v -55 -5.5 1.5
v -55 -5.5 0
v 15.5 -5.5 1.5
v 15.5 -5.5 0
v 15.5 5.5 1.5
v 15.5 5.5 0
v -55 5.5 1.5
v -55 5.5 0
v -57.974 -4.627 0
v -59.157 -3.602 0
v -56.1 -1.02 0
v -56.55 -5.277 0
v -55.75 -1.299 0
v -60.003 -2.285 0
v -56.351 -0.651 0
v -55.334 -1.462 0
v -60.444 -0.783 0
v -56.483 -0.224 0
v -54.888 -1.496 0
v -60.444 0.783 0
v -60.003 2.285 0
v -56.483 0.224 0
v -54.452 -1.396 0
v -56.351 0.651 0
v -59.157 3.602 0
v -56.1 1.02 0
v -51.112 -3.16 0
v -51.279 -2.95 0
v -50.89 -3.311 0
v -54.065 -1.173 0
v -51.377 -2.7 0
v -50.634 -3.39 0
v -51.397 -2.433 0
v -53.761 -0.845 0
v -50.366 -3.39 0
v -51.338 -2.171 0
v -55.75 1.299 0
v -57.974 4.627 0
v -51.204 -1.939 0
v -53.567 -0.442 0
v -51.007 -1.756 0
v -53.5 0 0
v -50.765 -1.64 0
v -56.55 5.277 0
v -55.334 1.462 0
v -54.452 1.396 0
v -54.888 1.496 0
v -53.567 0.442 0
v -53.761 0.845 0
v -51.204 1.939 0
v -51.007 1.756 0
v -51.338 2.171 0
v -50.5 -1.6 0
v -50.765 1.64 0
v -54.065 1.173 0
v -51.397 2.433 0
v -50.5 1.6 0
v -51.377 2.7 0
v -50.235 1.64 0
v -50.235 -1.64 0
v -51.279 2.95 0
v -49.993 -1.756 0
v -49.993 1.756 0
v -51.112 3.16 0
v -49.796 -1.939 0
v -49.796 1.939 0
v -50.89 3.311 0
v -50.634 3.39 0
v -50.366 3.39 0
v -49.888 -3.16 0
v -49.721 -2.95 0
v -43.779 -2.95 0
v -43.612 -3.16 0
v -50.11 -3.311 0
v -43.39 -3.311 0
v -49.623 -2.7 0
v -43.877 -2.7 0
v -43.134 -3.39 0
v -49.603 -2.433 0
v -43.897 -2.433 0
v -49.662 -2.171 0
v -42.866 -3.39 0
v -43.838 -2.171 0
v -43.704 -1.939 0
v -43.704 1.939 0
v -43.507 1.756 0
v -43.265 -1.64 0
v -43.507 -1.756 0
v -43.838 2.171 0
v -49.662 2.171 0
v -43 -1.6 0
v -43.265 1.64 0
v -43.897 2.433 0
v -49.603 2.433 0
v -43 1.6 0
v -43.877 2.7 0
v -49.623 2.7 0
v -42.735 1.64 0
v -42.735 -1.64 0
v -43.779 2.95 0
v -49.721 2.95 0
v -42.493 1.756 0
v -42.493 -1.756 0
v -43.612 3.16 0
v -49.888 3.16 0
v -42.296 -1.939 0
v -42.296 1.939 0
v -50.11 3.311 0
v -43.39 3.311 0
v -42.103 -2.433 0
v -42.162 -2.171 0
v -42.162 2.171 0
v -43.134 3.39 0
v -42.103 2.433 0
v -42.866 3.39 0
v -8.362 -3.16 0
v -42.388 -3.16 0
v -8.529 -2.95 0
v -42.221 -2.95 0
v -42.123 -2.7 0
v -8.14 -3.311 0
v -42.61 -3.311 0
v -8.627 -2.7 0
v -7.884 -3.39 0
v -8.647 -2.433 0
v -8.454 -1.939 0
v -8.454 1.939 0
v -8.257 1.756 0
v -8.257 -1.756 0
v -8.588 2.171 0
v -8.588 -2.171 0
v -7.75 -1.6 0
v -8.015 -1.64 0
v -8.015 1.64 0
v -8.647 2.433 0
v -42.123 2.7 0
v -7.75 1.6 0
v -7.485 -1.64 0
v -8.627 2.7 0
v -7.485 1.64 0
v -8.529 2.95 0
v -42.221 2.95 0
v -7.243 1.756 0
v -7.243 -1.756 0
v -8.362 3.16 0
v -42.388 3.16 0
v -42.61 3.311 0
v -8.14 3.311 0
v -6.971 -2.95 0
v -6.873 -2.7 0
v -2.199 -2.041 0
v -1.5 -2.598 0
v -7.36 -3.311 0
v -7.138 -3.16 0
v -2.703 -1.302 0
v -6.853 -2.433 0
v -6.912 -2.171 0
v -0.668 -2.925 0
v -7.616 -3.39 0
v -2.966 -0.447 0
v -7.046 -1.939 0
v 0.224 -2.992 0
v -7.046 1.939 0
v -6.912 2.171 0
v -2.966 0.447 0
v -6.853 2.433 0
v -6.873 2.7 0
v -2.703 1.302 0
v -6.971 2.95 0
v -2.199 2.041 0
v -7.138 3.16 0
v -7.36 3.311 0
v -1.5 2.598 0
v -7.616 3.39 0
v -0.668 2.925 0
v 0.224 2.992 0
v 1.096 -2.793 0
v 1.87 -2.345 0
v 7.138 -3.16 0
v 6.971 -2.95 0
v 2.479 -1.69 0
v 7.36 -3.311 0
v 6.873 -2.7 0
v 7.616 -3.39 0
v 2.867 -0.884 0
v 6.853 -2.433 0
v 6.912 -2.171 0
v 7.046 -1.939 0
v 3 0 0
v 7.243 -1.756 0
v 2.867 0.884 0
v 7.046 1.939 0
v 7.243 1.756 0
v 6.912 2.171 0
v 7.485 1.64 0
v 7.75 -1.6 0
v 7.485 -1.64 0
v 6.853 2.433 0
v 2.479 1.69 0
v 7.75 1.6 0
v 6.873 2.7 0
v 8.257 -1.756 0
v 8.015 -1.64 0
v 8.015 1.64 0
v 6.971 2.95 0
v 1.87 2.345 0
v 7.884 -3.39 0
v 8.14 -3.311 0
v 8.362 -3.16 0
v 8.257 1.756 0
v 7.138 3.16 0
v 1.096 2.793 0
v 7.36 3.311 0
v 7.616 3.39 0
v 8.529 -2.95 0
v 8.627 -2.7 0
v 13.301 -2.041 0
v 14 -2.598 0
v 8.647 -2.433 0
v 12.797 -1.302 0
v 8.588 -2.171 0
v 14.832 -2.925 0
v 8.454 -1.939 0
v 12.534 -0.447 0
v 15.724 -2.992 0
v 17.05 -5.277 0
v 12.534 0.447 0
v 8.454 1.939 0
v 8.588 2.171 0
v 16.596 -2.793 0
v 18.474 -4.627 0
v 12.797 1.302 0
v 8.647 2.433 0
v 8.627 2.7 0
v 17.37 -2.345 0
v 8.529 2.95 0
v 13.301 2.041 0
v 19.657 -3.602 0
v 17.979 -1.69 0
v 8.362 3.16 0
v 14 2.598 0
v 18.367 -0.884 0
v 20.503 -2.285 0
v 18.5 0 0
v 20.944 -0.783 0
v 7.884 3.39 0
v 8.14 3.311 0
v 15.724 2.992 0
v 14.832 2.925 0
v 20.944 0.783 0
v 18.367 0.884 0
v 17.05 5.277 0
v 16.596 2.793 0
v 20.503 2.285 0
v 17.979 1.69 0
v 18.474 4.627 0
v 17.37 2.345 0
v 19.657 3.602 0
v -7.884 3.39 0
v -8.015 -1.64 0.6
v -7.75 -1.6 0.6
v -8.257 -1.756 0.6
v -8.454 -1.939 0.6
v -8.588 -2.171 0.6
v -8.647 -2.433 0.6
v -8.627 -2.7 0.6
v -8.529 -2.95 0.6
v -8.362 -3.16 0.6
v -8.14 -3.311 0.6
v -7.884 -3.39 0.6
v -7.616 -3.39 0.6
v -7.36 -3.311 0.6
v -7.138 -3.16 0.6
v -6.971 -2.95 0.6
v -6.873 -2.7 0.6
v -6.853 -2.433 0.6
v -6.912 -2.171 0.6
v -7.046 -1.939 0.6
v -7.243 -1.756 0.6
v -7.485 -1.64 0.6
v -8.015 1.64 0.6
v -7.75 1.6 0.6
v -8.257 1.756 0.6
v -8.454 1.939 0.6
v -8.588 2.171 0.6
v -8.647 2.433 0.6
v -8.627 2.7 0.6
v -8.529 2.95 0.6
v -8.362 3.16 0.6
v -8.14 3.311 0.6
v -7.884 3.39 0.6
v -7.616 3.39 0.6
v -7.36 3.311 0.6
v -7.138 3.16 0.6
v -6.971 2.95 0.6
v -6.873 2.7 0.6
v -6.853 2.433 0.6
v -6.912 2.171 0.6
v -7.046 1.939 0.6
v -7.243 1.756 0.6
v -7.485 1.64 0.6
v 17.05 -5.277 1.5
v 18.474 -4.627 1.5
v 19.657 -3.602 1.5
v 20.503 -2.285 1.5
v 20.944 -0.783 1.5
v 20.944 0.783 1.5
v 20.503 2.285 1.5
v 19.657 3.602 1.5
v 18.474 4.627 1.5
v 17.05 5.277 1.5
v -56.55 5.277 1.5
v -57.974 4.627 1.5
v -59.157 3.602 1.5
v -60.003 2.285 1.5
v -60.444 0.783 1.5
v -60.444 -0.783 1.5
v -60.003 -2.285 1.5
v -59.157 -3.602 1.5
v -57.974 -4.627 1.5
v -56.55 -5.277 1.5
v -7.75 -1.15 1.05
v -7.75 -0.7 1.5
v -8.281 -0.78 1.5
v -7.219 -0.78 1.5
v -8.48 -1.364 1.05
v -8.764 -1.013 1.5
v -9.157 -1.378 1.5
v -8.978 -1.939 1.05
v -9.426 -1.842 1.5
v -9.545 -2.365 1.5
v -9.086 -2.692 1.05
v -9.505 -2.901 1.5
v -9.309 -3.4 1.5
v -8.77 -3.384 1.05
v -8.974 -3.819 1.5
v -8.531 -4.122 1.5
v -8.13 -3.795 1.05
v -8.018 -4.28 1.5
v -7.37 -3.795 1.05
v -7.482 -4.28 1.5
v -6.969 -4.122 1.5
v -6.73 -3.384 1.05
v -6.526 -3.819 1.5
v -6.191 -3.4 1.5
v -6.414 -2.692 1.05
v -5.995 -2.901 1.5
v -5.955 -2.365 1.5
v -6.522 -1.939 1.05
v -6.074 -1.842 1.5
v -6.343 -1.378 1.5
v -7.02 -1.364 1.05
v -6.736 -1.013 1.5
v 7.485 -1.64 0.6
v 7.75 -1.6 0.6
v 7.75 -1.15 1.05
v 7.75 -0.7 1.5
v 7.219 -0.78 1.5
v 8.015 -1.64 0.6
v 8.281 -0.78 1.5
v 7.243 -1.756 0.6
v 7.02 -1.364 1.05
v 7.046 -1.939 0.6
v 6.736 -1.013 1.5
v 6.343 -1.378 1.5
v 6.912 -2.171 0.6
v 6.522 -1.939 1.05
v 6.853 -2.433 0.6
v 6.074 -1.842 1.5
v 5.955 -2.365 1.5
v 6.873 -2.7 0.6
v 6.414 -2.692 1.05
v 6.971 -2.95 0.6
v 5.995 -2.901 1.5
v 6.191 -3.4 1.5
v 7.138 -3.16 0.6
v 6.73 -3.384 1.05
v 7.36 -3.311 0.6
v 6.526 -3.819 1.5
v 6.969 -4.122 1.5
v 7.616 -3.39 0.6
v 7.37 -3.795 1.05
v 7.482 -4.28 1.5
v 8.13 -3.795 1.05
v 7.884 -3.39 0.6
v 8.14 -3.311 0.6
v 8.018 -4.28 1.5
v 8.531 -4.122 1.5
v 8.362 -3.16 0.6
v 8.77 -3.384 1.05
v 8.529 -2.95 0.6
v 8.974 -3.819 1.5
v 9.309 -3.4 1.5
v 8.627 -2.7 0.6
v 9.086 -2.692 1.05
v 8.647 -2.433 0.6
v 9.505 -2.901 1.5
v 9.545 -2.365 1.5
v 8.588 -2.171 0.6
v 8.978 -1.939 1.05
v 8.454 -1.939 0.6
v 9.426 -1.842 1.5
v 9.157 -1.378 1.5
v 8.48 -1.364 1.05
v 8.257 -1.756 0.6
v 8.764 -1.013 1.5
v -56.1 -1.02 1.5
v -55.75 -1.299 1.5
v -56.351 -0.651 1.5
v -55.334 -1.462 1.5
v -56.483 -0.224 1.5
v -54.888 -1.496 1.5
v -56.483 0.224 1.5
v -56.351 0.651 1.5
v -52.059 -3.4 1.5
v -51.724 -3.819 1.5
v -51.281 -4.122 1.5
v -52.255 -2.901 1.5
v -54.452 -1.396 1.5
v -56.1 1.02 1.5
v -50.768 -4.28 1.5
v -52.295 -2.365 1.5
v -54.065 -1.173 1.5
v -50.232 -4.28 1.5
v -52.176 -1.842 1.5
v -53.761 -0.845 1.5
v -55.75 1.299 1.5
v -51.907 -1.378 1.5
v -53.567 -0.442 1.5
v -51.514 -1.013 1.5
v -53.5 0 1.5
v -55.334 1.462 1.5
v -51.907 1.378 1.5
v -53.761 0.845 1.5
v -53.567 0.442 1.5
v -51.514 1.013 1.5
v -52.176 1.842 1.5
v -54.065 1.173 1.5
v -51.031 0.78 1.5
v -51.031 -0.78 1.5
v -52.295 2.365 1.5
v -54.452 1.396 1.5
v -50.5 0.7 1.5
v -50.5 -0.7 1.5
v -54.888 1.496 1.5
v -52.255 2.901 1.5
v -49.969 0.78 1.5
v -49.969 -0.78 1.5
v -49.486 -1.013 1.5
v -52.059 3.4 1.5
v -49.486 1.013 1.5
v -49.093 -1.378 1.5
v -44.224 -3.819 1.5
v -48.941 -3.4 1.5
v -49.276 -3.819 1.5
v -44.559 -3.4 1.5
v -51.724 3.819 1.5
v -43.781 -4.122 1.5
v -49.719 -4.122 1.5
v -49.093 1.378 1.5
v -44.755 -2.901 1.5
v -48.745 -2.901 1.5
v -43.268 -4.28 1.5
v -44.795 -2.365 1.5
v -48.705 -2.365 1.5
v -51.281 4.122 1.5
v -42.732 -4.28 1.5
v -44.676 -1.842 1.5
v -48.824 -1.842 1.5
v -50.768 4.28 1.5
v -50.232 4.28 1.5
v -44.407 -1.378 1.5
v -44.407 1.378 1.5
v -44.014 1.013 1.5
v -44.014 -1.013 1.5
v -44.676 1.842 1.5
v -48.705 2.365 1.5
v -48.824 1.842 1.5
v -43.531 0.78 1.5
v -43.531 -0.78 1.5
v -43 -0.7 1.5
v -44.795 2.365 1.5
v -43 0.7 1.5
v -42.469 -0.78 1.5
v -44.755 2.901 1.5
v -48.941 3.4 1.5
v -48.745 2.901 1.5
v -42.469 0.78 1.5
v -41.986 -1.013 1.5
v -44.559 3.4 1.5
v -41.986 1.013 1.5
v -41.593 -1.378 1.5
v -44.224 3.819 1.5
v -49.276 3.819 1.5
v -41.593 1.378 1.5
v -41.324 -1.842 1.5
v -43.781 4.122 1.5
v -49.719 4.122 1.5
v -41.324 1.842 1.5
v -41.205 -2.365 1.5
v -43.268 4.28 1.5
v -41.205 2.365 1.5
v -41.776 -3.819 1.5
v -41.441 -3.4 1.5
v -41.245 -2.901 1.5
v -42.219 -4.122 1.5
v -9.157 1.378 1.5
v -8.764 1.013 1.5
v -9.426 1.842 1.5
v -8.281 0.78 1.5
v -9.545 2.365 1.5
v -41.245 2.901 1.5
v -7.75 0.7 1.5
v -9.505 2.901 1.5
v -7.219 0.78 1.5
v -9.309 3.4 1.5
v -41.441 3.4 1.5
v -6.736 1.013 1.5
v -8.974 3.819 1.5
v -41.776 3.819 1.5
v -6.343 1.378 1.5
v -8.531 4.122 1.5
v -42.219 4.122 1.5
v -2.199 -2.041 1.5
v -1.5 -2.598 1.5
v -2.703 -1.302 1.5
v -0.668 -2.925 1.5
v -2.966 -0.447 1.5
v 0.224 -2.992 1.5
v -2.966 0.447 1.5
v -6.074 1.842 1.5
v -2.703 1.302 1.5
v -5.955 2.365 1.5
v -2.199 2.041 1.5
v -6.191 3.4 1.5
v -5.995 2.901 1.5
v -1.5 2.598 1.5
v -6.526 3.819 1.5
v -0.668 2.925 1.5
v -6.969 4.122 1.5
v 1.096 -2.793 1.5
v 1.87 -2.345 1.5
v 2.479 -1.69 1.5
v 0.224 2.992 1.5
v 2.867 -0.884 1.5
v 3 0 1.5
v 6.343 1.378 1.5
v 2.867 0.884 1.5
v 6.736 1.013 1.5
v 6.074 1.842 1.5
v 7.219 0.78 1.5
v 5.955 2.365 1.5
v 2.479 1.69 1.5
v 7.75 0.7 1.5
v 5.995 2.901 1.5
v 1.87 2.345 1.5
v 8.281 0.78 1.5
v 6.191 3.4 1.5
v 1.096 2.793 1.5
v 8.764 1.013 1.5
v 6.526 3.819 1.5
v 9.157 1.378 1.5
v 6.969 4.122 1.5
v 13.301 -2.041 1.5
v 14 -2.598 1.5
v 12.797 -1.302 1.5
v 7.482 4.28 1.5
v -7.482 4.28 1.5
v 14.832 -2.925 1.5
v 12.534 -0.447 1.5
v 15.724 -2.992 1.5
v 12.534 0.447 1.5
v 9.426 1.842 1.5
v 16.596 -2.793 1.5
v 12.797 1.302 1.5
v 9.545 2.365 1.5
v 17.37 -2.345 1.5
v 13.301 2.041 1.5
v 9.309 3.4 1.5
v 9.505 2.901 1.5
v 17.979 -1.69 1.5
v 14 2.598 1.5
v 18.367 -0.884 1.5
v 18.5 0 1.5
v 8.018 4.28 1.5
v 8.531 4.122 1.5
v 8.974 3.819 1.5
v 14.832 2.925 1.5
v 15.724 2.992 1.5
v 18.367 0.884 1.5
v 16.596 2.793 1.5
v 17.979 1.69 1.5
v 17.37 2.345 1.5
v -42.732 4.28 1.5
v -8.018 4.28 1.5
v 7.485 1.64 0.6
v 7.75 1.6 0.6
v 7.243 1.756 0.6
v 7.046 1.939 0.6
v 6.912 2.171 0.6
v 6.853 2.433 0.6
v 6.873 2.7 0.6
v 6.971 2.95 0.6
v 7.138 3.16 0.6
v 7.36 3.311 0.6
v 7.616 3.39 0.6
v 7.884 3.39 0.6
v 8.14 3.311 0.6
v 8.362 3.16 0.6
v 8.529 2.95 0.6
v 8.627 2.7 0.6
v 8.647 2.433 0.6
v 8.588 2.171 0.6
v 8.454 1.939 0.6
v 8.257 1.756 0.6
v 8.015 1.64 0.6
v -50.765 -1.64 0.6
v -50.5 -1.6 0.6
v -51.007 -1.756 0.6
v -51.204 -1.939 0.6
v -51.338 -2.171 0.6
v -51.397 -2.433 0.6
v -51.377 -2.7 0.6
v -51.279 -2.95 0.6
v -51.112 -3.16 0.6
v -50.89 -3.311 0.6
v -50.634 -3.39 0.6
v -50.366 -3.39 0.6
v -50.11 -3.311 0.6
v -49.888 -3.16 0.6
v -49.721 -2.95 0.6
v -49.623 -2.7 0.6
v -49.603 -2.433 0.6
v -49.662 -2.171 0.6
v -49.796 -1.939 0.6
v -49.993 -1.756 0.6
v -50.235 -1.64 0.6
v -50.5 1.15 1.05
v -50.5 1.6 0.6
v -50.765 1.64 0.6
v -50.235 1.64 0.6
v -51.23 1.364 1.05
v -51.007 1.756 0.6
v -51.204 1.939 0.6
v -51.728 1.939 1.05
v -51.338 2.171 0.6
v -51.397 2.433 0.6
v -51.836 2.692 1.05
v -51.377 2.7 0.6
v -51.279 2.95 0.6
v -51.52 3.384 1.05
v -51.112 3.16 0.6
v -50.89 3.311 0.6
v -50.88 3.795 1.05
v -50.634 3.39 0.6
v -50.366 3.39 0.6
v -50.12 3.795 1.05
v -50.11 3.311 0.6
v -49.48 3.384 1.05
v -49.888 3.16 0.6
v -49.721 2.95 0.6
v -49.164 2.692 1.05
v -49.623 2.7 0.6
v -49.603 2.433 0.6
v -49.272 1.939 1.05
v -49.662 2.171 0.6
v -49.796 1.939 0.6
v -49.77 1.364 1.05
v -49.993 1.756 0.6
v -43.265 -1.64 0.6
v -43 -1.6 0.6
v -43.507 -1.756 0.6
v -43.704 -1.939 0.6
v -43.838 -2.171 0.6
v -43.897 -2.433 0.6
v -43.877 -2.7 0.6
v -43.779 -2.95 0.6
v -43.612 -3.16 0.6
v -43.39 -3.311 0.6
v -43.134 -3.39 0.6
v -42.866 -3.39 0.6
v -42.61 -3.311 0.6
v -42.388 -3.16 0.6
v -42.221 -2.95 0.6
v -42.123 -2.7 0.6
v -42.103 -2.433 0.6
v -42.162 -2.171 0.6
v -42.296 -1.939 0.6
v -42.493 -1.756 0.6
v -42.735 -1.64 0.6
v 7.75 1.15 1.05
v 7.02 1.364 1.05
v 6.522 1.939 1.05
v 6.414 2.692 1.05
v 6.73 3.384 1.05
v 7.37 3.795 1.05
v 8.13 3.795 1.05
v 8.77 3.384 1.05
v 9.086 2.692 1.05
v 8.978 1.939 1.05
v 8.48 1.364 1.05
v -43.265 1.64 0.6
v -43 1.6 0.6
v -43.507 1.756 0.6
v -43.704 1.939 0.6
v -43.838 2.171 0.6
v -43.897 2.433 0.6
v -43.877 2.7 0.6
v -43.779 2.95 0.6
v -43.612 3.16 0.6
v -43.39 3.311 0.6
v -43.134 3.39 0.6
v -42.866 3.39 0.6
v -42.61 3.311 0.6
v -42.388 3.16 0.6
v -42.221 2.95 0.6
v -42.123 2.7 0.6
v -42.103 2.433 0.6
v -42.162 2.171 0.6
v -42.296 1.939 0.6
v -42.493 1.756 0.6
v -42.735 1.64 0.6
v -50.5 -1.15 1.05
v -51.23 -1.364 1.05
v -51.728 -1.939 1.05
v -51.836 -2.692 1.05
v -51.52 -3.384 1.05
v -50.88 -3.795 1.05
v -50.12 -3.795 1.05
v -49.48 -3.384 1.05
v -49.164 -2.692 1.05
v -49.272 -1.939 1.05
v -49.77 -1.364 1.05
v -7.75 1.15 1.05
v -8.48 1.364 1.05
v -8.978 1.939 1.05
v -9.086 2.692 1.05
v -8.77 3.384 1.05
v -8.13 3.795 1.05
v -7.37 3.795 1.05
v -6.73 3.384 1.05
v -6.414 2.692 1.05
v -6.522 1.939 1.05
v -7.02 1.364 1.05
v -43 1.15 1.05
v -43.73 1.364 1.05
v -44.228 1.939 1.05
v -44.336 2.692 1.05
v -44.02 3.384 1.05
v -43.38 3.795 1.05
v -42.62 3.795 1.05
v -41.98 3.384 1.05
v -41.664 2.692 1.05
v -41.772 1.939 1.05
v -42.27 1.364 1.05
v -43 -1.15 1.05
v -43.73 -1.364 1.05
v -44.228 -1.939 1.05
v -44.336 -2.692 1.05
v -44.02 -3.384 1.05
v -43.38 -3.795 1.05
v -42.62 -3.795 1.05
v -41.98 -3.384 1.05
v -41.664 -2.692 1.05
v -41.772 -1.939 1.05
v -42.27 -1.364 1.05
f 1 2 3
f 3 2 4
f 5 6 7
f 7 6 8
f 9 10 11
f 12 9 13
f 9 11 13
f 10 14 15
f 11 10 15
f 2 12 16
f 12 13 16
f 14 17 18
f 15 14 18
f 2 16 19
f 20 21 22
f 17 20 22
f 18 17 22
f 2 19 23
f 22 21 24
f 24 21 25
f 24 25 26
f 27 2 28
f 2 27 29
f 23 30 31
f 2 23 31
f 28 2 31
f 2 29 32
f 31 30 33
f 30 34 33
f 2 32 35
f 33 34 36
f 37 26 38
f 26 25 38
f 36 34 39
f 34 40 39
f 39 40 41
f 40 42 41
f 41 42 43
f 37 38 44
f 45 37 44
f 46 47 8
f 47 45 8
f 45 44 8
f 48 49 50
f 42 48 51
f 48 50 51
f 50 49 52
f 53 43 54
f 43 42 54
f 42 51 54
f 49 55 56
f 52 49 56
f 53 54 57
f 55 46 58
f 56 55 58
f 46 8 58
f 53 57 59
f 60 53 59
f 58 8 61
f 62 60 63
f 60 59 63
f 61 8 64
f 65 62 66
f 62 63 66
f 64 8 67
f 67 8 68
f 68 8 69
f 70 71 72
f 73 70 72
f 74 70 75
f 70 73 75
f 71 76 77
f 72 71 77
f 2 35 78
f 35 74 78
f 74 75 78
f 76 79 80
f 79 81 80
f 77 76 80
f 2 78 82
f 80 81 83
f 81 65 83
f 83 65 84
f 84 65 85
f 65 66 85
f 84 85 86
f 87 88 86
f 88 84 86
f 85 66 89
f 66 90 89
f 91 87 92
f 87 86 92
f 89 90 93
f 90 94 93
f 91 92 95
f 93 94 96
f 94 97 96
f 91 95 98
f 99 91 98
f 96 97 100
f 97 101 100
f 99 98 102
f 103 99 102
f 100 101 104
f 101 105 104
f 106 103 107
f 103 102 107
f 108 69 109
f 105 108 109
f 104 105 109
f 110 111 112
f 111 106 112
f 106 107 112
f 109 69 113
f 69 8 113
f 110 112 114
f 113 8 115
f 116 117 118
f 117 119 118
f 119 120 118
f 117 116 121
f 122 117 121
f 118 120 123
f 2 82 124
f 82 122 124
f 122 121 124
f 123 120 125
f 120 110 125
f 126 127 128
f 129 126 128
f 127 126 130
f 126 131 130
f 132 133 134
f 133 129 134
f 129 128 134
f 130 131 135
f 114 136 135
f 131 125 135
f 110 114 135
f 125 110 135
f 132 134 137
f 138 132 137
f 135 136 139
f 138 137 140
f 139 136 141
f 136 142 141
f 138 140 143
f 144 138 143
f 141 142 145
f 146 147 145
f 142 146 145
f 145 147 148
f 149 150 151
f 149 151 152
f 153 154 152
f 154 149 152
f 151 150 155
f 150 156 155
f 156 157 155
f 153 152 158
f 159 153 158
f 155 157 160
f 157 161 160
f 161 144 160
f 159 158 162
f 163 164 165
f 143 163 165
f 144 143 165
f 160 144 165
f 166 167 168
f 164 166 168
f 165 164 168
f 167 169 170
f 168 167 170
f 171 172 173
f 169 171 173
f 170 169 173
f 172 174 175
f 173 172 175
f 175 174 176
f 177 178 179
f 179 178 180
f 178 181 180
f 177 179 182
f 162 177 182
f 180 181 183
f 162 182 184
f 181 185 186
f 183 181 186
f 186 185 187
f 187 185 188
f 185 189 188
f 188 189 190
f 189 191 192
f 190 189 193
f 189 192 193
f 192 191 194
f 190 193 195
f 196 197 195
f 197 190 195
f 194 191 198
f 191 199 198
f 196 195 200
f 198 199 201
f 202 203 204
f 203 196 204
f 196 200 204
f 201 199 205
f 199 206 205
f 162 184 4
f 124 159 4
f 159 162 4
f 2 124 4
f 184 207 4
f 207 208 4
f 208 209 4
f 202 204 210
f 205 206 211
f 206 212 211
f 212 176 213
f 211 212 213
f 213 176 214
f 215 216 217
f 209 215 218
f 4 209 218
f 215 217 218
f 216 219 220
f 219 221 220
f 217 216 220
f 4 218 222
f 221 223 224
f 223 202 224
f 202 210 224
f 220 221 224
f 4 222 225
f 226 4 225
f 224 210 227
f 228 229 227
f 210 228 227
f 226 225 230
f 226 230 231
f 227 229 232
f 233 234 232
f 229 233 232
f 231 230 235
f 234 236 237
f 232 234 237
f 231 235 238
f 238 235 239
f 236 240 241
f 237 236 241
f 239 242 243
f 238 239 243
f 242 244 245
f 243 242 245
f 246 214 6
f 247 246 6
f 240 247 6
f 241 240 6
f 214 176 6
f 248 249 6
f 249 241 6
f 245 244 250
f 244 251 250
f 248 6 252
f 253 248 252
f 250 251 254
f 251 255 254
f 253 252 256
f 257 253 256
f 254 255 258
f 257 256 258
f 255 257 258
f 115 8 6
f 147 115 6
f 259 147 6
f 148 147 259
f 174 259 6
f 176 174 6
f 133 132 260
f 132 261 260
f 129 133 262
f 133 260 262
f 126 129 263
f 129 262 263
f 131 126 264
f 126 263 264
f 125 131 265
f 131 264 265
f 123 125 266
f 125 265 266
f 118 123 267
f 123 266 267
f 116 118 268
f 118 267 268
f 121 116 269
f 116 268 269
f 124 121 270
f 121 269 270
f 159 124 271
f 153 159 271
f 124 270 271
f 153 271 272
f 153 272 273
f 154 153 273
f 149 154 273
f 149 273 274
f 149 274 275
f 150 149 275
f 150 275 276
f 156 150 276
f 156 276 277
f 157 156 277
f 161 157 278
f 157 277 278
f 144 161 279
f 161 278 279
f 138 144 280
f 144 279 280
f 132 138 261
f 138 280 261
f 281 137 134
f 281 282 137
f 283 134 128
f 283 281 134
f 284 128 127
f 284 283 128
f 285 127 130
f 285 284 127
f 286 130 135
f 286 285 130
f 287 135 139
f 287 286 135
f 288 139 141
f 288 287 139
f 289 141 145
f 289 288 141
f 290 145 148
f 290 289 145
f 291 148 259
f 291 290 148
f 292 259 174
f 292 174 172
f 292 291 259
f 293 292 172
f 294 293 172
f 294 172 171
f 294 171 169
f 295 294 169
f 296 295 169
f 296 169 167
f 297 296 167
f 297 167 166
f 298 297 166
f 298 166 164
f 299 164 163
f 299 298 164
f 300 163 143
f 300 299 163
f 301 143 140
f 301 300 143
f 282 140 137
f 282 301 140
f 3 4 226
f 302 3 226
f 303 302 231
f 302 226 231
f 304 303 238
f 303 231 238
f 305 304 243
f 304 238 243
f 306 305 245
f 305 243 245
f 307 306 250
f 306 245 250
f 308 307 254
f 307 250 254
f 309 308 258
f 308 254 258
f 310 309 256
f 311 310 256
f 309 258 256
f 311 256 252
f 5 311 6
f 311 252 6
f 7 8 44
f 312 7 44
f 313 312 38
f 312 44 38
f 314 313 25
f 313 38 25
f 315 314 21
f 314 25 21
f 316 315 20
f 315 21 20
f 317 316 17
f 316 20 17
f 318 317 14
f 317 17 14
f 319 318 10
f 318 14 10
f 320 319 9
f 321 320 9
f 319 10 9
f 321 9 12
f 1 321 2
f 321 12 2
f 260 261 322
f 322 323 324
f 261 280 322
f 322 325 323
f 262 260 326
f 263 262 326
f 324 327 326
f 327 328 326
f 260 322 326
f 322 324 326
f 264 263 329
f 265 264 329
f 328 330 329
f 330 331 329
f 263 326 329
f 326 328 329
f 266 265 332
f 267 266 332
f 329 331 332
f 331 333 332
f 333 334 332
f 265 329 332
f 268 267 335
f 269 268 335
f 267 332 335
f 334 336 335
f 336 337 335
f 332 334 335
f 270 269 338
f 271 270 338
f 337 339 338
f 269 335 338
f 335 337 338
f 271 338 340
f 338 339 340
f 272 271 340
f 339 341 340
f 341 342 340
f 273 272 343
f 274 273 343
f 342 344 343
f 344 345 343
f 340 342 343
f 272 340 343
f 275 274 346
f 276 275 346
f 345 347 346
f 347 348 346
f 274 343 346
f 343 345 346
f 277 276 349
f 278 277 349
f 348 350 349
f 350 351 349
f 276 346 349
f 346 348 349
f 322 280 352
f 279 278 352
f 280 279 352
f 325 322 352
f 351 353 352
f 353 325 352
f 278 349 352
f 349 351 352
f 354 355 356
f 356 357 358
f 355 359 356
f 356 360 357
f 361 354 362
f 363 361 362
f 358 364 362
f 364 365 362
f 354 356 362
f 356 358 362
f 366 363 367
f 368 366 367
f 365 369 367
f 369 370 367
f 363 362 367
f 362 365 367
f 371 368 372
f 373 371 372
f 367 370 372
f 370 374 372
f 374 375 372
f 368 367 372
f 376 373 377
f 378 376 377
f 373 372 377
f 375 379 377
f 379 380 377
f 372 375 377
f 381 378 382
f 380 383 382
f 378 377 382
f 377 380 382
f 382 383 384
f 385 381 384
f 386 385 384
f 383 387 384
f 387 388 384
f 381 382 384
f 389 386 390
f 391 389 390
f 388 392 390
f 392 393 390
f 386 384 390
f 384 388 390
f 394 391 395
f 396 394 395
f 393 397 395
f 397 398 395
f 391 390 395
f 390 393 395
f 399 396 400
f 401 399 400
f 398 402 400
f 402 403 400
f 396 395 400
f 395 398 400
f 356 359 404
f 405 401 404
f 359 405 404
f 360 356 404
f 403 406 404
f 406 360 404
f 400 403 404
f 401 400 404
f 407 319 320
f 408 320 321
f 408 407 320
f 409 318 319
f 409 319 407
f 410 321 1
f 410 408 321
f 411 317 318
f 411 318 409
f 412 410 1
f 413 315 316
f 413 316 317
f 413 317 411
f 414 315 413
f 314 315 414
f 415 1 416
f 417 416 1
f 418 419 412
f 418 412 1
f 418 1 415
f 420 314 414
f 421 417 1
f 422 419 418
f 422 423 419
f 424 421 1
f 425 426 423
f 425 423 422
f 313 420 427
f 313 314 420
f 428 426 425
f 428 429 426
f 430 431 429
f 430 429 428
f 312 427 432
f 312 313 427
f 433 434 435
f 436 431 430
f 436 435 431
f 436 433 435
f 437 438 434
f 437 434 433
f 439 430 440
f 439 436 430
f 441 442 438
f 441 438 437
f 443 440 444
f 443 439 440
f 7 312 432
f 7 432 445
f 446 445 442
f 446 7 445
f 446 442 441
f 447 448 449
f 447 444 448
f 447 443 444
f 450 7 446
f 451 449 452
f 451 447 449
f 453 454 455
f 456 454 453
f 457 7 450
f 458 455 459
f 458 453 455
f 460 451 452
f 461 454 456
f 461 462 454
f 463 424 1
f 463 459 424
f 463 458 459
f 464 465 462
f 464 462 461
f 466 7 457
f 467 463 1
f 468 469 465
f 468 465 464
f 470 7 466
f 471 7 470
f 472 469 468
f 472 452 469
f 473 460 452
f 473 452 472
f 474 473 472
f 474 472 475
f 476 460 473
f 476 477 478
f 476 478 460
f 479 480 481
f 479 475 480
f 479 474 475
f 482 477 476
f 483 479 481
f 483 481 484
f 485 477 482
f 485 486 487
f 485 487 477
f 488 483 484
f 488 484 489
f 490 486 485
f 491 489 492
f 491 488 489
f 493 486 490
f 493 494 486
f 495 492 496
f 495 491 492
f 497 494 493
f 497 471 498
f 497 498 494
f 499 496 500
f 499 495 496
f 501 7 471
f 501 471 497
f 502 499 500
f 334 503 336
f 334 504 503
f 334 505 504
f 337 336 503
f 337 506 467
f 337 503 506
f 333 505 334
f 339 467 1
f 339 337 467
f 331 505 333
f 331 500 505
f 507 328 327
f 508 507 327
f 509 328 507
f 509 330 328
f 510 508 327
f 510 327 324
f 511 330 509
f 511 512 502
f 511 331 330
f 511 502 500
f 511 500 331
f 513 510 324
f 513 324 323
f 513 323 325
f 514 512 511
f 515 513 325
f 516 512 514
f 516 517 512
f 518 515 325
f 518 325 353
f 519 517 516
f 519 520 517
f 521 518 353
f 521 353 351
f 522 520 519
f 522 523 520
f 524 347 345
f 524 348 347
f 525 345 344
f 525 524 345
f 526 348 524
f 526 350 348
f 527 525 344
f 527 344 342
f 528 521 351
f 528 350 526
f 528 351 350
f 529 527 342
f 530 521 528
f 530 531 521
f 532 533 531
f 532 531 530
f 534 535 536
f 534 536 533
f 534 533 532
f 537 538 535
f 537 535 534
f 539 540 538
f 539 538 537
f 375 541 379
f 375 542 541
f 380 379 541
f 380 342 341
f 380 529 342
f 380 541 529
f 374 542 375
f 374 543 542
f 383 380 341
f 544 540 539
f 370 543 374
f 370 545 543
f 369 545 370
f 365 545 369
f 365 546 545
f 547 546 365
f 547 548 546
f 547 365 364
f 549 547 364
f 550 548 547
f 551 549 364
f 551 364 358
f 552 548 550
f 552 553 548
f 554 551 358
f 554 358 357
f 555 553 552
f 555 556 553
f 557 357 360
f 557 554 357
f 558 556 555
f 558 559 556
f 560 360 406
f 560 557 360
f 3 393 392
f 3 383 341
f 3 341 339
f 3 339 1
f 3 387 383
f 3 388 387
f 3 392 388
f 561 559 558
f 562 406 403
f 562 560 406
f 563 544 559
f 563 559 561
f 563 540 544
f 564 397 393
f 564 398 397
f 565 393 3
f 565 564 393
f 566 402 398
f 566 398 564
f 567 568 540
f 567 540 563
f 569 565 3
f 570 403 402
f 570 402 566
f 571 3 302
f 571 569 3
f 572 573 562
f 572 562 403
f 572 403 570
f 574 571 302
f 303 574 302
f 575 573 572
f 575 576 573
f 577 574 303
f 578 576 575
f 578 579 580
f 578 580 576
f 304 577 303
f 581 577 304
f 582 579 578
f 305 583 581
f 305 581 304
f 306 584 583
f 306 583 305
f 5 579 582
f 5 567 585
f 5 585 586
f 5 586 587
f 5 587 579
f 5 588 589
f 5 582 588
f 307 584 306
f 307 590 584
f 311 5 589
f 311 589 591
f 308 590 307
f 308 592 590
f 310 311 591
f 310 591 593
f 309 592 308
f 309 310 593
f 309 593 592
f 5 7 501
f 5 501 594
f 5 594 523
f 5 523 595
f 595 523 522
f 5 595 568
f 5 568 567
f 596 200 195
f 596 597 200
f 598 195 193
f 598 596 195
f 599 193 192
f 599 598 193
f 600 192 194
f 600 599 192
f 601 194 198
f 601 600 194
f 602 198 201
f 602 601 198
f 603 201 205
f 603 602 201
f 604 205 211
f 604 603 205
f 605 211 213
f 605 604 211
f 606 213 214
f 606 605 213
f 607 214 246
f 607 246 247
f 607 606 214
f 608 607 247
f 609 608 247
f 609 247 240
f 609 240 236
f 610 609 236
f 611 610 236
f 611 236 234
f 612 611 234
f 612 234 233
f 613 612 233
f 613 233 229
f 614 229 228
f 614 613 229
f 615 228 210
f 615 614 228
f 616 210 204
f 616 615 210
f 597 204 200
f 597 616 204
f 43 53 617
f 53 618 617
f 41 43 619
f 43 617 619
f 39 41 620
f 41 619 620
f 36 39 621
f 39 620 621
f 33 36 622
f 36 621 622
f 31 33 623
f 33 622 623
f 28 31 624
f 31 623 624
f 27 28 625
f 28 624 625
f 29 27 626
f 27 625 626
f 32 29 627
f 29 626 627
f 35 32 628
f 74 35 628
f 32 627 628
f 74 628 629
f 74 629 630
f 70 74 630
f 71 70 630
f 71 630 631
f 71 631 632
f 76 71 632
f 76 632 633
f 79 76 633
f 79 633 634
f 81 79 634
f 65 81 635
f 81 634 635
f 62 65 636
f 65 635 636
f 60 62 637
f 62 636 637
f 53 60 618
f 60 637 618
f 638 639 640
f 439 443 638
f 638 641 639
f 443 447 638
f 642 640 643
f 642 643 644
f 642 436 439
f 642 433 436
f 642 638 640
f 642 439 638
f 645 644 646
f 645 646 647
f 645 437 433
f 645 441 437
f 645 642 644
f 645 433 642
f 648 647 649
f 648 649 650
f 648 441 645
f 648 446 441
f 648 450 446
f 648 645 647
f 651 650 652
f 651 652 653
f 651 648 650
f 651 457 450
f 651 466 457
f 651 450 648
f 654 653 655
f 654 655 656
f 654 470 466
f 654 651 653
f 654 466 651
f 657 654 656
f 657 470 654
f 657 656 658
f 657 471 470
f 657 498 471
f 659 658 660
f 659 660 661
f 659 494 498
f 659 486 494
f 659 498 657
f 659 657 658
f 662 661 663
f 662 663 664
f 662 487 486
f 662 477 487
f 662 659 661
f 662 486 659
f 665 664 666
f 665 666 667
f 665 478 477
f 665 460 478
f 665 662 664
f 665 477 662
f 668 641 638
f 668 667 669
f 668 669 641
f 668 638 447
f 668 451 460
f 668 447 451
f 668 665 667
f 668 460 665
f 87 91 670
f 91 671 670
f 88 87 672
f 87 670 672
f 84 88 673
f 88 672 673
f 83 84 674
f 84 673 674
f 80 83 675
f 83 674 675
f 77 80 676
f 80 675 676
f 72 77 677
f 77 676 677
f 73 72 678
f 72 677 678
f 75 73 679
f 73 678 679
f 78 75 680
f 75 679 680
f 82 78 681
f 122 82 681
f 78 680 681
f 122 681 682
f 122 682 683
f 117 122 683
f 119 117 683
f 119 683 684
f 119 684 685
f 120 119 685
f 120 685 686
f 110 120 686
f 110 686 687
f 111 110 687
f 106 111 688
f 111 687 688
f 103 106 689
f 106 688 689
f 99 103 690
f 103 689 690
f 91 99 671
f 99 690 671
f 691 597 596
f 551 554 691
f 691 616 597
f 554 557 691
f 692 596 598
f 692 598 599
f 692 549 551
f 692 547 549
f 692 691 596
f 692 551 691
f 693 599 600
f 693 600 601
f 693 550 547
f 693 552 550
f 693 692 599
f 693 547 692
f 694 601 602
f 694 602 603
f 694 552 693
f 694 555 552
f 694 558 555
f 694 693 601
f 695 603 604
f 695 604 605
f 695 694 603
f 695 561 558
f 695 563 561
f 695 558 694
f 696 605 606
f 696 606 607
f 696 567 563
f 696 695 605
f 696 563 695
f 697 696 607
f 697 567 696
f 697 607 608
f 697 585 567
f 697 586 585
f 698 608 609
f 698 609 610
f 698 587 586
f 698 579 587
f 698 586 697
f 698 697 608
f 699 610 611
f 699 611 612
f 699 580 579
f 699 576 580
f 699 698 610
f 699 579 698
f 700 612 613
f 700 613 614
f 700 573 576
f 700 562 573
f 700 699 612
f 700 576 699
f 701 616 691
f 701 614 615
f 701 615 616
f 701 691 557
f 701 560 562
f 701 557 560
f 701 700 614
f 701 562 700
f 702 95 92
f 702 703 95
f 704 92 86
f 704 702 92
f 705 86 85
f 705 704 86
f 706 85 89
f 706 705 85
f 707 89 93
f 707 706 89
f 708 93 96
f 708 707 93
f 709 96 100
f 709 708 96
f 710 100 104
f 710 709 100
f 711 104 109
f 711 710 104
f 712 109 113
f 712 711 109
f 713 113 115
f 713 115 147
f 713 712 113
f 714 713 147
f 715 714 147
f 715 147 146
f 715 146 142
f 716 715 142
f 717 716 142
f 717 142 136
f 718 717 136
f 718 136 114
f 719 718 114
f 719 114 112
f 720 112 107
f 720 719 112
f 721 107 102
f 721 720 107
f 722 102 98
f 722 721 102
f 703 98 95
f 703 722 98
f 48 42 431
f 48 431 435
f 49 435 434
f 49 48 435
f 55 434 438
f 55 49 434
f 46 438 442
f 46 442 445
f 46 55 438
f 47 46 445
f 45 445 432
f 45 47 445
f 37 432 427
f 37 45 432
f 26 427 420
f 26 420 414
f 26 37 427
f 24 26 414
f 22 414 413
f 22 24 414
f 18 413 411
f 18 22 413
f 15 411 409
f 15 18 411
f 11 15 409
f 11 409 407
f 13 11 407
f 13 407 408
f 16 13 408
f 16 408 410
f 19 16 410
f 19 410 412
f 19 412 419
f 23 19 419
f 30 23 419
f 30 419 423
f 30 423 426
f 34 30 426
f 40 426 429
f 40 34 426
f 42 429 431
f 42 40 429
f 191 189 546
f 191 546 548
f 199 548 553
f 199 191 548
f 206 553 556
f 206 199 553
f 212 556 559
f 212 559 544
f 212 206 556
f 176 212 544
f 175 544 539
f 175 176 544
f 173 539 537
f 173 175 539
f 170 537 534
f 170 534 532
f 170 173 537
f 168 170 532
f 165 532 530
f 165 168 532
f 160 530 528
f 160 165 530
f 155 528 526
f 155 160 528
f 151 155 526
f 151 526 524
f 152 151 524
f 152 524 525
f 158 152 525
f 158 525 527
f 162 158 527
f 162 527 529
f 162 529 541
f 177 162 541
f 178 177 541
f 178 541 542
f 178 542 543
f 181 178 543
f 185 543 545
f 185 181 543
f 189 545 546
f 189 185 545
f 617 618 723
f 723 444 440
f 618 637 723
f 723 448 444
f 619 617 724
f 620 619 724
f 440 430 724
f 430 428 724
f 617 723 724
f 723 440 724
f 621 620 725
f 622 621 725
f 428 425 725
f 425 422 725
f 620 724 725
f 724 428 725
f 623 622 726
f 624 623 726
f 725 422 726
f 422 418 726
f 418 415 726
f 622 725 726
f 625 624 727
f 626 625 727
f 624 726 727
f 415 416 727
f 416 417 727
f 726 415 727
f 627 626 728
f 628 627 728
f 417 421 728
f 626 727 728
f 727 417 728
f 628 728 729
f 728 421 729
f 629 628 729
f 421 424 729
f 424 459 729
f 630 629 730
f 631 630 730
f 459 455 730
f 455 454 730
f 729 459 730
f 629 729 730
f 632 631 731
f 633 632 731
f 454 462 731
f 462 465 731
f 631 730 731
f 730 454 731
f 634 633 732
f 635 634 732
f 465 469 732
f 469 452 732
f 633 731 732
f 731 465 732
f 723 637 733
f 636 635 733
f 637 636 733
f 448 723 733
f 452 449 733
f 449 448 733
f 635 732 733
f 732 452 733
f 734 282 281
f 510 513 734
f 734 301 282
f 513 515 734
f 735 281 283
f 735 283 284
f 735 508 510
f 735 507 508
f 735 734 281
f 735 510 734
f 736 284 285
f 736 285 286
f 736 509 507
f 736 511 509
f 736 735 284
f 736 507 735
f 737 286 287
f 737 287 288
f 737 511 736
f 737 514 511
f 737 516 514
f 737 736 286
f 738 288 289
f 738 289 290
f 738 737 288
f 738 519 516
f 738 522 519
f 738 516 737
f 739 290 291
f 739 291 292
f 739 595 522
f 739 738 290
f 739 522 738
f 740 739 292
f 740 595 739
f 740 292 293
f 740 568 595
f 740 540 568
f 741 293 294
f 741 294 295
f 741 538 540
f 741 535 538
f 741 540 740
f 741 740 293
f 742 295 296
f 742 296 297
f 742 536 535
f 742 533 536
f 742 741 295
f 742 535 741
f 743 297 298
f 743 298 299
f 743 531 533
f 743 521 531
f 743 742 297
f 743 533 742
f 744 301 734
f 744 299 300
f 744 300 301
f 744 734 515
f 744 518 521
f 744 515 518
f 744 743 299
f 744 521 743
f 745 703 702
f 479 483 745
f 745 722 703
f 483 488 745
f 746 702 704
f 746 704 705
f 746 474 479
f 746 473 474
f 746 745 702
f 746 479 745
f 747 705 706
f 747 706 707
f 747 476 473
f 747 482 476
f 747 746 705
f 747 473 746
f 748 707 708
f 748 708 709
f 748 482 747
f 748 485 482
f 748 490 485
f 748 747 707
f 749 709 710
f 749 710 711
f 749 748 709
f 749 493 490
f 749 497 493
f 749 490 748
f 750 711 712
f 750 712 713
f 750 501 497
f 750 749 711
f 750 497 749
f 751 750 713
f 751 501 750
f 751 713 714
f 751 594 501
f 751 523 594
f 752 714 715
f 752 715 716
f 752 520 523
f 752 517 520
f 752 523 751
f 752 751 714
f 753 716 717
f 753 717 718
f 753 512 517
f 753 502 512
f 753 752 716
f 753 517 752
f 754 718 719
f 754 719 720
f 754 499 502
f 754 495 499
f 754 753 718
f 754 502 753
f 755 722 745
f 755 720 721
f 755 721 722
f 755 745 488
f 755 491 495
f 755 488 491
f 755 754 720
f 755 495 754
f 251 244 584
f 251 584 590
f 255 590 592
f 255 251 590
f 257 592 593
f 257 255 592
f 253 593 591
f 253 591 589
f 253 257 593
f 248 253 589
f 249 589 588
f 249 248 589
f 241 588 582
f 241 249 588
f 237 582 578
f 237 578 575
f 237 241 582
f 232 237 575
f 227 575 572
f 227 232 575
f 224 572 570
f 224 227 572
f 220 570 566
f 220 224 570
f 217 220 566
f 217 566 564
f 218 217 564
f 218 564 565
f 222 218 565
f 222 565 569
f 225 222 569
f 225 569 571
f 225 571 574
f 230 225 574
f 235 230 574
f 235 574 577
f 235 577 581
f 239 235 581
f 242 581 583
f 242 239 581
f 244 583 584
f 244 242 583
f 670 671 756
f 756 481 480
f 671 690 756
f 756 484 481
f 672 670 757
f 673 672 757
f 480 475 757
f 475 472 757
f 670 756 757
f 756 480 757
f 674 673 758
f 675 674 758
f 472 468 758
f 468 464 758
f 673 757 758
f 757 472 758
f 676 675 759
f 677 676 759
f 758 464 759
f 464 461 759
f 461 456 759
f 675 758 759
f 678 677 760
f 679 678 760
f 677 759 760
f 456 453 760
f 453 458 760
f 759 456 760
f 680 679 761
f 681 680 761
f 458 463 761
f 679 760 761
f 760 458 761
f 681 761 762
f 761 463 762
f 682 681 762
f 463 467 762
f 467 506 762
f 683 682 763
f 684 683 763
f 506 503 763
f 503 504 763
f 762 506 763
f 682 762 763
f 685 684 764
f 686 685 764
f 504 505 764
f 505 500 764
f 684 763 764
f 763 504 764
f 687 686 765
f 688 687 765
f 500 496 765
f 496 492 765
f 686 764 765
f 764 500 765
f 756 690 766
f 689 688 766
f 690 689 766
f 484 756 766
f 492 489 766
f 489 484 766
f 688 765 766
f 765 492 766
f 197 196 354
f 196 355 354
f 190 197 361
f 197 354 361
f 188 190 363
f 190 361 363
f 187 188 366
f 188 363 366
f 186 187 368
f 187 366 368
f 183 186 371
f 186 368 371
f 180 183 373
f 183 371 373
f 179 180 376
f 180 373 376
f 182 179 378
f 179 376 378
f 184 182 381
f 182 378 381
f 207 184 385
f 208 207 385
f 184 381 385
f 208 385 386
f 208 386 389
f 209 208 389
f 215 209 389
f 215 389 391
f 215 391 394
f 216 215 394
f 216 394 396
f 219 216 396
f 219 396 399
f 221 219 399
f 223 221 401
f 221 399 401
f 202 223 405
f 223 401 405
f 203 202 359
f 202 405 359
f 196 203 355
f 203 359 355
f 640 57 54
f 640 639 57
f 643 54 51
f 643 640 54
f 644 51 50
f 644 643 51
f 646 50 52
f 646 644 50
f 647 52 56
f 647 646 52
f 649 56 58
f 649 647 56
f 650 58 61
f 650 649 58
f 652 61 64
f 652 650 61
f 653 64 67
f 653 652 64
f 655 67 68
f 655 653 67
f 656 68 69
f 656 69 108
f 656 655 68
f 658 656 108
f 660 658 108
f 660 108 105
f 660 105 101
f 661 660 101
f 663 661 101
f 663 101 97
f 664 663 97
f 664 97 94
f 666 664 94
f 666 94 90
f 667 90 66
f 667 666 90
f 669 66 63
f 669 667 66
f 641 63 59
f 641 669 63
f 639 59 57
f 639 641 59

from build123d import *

# Parameters (mm, degrees)
SKETCH1_R                                    = 1.5
SKETCH1_R_2                                  = 3
BOSS_EXTRUDE1_DEPTH                          = 1.5
CSK_FOR_M1_6_COUNTERSUNK_FLAT_HEAD_S_2_COUNT = 2
CSK_FOR_M1_6_COUNTERSUNK_FLAT_HEAD_S_2_PITCH = 15.5
CSK_FOR_M1_6_COUNTERSUNK_FLAT_HEAD_S_3_COUNT = 2
CSK_FOR_M1_6_COUNTERSUNK_FLAT_HEAD_S_3_PITCH = 58.25
CSK_FOR_M1_6_COUNTERSUNK_FLAT_HEAD_S_4_COUNT = 2
CSK_FOR_M1_6_COUNTERSUNK_FLAT_HEAD_S_4_PITCH = 50.75


with BuildPart() as part:
    # Sketch1 → Boss-Extrude1 (new body)
    with BuildSketch(Plane.XY):
        with BuildLine():
            Line((15.5, 5.5), (-55, 5.5))
            ThreePointArc((-55, 5.5), (-60.5, 0), (-55, -5.5))
            Line((-55, -5.5), (15.5, -5.5))
            ThreePointArc((15.5, -5.5), (21, 0), (15.5, 5.5))
        make_face()
        with Locations((-55, 0)):
            Circle(SKETCH1_R, mode=Mode.SUBTRACT)
        Circle(SKETCH1_R_2, mode=Mode.SUBTRACT)
        with Locations((15.5, 0)):
            Circle(SKETCH1_R_2, mode=Mode.SUBTRACT)
    extrude(amount=BOSS_EXTRUDE1_DEPTH)

    # Sketch2 → CSK for M1.6 Countersunk Flat Head Screw1 (revolve, cut)
    with BuildSketch(Plane(origin=(7.75, 2.5, 1.5), x_dir=(0, -1, 0), z_dir=(1, 0, 0))):
        Polygon((0, 0), (0, 1.5), (0.9, 1.5), (0.9, 0.9), (1.8, 0), align=None)
    csk_for_m1_6_countersunk_flat_head_screw = revolve(axis=Axis((7.75, 2.5, 7.85), (0, 0, -1)), mode=Mode.SUBTRACT)

    # CSK for M1.6 Countersunk Flat Head S 2: CSK for M1.6 Countersunk Flat Head Screw1 ×2
    with Locations(*[(-i * CSK_FOR_M1_6_COUNTERSUNK_FLAT_HEAD_S_2_PITCH, 0, 0) for i in range(1, CSK_FOR_M1_6_COUNTERSUNK_FLAT_HEAD_S_2_COUNT)]):
        add(csk_for_m1_6_countersunk_flat_head_screw, mode=Mode.SUBTRACT)

    # CSK for M1.6 Countersunk Flat Head S 3: CSK for M1.6 Countersunk Flat Head Screw1 ×2
    with Locations(*[(-i * CSK_FOR_M1_6_COUNTERSUNK_FLAT_HEAD_S_3_PITCH, 0, 0) for i in range(1, CSK_FOR_M1_6_COUNTERSUNK_FLAT_HEAD_S_3_COUNT)]):
        add(csk_for_m1_6_countersunk_flat_head_screw, mode=Mode.SUBTRACT)

    # CSK for M1.6 Countersunk Flat Head S 4: CSK for M1.6 Countersunk Flat Head Screw1 ×2
    with Locations(*[(-i * CSK_FOR_M1_6_COUNTERSUNK_FLAT_HEAD_S_4_PITCH, 0, 0) for i in range(1, CSK_FOR_M1_6_COUNTERSUNK_FLAT_HEAD_S_4_COUNT)]):
        add(csk_for_m1_6_countersunk_flat_head_screw, mode=Mode.SUBTRACT)

    # Mirror1: CSK for M1.6 Countersunk Flat Head Screw1 across plane
    add(csk_for_m1_6_countersunk_flat_head_screw.mirror(Plane.ZX), mode=Mode.SUBTRACT)

    # Mirror1 copy 1 sketch → Mirror1 copy 1 (revolve, cut)
    with BuildSketch(Plane(origin=(-7.75, -2.5, 1.5), x_dir=(0, 1, 0), z_dir=(1, 0, 0))):
        Polygon((0, 0), (0, -1.5), (0.9, -1.5), (0.9, -0.9), (1.8, 0), align=None)
    revolve(axis=Axis((-7.75, -2.5, 7.85), (0, 0, 1)), mode=Mode.SUBTRACT)

    # Mirror1 copy 2 sketch → Mirror1 copy 2 (revolve, cut)
    with BuildSketch(Plane(origin=(-50.5, -2.5, 1.5), x_dir=(0, 1, 0), z_dir=(1, 0, 0))):
        Polygon((0, 0), (0, -1.5), (0.9, -1.5), (0.9, -0.9), (1.8, 0), align=None)
    revolve(axis=Axis((-50.5, -2.5, 7.85), (0, 0, 1)), mode=Mode.SUBTRACT)

    # Mirror1 copy 3 sketch → Mirror1 copy 3 (revolve, cut)
    with BuildSketch(Plane(origin=(-43, -2.5, 1.5), x_dir=(0, 1, 0), z_dir=(1, 0, 0))):
        Polygon((0, 0), (0, -1.5), (0.9, -1.5), (0.9, -0.9), (1.8, 0), align=None)
    revolve(axis=Axis((-43, -2.5, 7.85), (0, 0, 1)), mode=Mode.SUBTRACT)


solid = part.part
